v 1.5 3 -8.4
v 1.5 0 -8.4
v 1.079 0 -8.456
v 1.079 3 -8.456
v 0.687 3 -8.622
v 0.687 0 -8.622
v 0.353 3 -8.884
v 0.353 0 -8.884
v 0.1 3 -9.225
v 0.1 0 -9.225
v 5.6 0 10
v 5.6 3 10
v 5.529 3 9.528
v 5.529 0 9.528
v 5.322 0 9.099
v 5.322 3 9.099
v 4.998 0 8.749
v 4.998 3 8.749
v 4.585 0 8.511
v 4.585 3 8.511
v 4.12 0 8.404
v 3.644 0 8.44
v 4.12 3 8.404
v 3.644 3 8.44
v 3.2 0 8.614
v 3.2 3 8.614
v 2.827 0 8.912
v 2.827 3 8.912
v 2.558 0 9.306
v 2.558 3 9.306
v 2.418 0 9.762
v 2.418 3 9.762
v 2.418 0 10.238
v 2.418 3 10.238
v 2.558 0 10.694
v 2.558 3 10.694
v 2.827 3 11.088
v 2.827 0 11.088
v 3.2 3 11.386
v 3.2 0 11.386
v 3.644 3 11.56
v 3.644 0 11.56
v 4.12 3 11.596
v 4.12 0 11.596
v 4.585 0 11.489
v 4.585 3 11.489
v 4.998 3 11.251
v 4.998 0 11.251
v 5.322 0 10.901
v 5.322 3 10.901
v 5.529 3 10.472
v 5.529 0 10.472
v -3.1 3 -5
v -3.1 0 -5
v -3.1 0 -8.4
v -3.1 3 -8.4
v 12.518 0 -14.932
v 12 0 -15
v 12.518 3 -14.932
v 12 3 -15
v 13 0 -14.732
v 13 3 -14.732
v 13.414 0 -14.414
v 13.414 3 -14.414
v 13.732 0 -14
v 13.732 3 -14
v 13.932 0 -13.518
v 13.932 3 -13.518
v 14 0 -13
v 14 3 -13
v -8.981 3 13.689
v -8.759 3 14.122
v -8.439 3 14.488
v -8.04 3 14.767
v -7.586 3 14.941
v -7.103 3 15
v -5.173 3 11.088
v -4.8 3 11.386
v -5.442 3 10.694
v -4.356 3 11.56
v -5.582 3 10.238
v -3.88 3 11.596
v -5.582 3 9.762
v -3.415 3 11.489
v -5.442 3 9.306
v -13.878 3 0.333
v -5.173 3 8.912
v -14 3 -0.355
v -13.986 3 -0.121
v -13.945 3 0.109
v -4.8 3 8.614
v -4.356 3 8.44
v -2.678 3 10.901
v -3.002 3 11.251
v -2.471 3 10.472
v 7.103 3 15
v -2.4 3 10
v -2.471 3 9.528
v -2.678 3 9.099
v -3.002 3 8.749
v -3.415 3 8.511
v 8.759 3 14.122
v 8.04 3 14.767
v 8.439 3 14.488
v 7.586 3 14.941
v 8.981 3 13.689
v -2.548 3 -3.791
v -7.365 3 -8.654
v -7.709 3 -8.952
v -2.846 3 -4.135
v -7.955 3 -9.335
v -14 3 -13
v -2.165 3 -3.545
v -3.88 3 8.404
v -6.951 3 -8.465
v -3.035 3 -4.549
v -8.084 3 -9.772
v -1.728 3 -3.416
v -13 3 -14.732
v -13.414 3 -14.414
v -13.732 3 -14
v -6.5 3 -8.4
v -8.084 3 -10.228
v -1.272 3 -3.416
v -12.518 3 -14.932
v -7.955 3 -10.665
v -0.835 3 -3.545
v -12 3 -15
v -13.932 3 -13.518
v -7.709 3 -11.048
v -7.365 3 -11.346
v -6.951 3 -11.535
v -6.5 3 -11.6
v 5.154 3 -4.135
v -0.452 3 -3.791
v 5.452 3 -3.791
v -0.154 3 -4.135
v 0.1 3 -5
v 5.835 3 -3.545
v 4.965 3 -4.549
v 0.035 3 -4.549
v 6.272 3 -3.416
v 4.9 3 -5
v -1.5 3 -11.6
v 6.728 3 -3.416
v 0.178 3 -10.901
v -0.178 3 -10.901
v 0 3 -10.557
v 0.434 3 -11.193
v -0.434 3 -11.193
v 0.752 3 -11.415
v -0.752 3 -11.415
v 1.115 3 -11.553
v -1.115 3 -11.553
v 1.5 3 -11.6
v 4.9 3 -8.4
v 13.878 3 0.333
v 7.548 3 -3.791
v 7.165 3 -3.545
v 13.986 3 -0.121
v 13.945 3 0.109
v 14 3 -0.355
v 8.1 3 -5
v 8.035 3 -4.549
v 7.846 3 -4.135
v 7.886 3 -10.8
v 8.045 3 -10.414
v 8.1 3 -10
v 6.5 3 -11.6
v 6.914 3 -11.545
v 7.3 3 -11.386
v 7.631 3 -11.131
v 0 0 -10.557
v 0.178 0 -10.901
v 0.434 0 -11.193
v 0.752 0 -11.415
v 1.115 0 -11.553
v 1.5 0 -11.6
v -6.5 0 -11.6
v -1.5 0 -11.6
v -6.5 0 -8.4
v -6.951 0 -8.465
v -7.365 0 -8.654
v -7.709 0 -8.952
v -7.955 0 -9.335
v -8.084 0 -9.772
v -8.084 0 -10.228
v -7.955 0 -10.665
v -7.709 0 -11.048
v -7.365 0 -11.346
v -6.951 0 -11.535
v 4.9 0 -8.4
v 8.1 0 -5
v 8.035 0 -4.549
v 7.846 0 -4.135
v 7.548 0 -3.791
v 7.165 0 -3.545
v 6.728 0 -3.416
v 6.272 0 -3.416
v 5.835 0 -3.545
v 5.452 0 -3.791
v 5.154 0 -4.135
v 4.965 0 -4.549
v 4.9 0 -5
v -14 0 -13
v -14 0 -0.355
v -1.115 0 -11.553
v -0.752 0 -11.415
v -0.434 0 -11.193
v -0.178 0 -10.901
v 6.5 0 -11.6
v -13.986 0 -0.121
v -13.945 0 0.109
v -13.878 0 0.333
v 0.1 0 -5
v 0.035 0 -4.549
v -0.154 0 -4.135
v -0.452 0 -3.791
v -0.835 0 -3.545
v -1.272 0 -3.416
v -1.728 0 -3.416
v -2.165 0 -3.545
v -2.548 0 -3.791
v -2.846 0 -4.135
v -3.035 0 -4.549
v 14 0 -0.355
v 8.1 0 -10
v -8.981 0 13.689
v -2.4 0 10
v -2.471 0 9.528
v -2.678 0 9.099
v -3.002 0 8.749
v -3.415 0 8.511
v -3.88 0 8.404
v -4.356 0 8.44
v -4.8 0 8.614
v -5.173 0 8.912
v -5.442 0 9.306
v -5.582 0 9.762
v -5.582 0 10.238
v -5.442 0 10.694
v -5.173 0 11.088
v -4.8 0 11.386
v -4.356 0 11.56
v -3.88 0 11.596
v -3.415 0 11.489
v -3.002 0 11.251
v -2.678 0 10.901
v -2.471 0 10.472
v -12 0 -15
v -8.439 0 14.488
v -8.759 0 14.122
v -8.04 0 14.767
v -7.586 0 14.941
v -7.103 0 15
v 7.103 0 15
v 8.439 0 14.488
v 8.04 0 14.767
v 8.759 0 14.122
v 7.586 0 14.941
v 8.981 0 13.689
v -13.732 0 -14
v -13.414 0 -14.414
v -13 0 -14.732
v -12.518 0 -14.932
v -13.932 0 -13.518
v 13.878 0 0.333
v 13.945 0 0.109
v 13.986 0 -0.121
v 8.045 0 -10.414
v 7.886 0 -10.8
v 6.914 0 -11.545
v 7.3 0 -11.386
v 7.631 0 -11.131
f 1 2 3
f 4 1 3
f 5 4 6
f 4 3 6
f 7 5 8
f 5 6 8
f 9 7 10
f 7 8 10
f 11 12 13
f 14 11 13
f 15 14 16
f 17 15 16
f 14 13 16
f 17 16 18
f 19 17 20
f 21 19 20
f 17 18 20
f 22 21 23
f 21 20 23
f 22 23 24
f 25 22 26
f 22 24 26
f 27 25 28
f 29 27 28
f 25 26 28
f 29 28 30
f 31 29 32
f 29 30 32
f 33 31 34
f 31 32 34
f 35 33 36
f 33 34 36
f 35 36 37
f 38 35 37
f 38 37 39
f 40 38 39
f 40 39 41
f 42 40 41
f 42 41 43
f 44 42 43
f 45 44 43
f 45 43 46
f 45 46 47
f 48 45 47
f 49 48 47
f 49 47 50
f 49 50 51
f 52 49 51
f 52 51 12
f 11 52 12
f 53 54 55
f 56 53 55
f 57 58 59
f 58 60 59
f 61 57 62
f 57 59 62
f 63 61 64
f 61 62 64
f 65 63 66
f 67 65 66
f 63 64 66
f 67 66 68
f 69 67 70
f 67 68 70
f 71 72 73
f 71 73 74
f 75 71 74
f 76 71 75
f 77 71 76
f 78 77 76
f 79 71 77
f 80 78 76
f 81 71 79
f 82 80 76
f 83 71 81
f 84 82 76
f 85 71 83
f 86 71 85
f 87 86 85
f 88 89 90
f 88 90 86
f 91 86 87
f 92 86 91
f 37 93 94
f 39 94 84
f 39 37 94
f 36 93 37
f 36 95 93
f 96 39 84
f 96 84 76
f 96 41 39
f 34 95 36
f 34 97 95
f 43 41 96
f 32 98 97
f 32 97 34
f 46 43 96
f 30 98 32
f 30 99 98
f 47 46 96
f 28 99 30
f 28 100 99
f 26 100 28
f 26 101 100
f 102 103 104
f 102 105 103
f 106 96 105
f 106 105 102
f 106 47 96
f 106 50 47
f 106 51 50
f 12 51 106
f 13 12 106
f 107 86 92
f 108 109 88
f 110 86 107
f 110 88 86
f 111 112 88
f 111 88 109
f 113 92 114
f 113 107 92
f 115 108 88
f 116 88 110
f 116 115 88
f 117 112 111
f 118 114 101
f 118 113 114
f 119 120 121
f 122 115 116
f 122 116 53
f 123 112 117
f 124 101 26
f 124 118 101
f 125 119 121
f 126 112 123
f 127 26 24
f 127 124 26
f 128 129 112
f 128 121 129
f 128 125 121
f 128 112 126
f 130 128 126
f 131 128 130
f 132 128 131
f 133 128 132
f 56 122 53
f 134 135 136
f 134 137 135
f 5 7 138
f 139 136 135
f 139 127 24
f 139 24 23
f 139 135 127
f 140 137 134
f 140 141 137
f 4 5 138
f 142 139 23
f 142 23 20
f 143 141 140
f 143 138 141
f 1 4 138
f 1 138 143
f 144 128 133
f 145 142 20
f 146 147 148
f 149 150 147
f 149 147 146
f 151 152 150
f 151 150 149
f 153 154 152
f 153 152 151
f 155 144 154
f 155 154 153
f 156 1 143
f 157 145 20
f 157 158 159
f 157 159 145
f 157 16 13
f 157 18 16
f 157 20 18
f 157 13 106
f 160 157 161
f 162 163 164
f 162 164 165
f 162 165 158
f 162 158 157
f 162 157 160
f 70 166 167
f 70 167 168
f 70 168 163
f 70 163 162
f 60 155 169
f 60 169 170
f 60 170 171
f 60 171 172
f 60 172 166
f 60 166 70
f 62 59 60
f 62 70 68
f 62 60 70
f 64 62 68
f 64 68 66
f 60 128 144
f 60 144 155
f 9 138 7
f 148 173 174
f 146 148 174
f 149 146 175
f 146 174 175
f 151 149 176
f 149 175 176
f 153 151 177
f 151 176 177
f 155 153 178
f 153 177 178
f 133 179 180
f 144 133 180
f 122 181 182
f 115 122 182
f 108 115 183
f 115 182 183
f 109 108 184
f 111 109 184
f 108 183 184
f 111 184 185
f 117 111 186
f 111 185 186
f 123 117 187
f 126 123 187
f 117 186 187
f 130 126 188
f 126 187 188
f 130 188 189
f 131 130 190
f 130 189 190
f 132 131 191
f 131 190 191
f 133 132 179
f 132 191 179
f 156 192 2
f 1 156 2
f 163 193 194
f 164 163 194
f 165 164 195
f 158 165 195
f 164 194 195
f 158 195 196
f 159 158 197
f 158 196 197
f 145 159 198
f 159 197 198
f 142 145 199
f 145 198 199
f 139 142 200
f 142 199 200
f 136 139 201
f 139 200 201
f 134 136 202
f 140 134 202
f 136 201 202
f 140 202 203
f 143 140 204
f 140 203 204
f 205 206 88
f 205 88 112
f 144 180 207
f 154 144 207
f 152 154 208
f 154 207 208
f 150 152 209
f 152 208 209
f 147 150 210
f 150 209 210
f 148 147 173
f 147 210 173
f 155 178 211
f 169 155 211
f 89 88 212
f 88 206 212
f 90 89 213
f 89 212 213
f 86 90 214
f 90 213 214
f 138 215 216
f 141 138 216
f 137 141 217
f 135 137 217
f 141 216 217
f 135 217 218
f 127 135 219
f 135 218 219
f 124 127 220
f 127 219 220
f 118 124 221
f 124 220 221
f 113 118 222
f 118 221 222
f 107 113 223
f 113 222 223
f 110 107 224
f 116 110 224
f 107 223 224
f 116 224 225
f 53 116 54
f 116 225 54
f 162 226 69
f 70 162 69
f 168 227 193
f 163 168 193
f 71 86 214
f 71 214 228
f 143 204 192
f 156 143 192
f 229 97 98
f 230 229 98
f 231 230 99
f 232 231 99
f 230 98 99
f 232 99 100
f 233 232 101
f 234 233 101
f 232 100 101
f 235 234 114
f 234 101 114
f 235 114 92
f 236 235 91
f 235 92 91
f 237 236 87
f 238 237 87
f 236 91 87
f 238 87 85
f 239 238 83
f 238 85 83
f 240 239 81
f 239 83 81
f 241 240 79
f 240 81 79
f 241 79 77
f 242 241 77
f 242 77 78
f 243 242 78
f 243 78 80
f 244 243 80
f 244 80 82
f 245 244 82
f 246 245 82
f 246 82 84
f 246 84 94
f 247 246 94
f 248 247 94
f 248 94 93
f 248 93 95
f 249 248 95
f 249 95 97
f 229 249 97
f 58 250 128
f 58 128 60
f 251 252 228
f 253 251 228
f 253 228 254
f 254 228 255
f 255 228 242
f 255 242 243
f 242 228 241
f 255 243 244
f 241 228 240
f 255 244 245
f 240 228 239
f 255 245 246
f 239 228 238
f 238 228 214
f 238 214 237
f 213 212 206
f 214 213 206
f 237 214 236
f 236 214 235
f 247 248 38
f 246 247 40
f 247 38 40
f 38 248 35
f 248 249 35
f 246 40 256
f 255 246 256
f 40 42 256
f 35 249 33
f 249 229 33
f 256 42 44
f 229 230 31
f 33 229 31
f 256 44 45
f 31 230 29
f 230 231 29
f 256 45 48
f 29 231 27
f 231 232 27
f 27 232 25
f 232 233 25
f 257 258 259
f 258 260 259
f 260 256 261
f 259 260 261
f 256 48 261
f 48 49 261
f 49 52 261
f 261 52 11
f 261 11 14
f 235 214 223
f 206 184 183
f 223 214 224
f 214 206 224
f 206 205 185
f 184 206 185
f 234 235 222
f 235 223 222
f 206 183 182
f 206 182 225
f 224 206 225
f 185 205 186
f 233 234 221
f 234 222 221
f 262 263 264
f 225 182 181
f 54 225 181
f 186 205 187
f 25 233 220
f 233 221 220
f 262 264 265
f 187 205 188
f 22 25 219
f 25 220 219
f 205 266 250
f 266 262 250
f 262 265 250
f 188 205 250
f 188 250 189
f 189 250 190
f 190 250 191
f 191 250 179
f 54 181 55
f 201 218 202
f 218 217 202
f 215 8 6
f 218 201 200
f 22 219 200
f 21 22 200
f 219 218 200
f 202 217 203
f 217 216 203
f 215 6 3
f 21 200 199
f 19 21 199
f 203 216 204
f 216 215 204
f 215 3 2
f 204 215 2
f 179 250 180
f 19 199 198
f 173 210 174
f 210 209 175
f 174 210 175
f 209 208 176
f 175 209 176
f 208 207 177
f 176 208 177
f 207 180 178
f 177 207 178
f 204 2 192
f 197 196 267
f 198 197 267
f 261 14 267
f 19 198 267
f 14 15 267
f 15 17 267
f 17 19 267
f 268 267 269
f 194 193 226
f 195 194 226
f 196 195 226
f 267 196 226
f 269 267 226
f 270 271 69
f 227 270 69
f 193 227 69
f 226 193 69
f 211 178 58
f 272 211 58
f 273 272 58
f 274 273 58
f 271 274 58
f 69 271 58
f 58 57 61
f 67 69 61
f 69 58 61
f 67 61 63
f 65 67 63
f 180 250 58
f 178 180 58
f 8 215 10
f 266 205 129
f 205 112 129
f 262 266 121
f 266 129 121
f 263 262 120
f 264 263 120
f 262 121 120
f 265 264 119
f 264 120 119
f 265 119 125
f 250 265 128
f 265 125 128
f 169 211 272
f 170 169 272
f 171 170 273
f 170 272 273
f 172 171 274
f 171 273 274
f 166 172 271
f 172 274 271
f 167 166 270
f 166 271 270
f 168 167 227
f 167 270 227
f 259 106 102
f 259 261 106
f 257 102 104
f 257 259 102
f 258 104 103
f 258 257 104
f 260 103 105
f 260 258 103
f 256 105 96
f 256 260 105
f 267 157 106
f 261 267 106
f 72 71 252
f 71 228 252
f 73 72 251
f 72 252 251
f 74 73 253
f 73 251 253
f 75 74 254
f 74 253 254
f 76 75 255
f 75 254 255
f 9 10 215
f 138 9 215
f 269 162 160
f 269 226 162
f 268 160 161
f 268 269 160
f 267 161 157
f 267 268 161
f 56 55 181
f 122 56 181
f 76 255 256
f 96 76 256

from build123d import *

# Parameters (mm, degrees)
SKETCH1_W           = 28
SKETCH1_H           = 30
BOSS_EXTRUDE1_DEPTH = 3
SKETCH2_R           = 1.6
CUT_EXTRUDE1_DEPTH  = 4
FILLET1_R           = 2


with BuildPart() as part:
    # Sketch1 → Boss-Extrude1 (new body)
    with BuildSketch(Plane(origin=(0, 0, 0), x_dir=(1, 0, 0), z_dir=(0, 1, 0))):
        Rectangle(SKETCH1_W, SKETCH1_H)
        with BuildLine():
            ThreePointArc((1.5, 8.4), (0.687397597, 8.621712173), (0.1, 9.225403331))
            Line((0.1, 9.225403331), (0.1, 5))
            ThreePointArc((0.1, 5), (-1.5, 3.4), (-3.1, 5))
            Line((-3.1, 5), (-3.1, 8.4))
            Line((-3.1, 8.4), (-6.5, 8.4))
            ThreePointArc((-6.5, 8.4), (-8.1, 10), (-6.5, 11.6))
            Line((-6.5, 11.6), (-1.5, 11.6))
            ThreePointArc((-1.5, 11.6), (-0.586447127, 11.313552873), (0, 10.556776436))
            ThreePointArc((0, 10.556776436), (0.586447127, 11.313552873), (1.5, 11.6))
            Line((1.5, 11.6), (6.5, 11.6))
            ThreePointArc((6.5, 11.6), (7.63137085, 11.13137085), (8.1, 10))
            Line((8.1, 10), (8.1, 5))
            ThreePointArc((8.1, 5), (6.5, 3.4), (4.9, 5))
            Line((4.9, 5), (4.9, 8.4))
            Line((4.9, 8.4), (1.5, 8.4))
        make_face(mode=Mode.SUBTRACT)
    extrude(amount=BOSS_EXTRUDE1_DEPTH)

    # Sketch2 → Cut-Extrude1 (cut, through all)
    with BuildSketch(Plane(origin=(0, 3, 0), x_dir=(1, 0, 0), z_dir=(0, 1, 0))):
        with Locations((-4, -10)):
            Circle(SKETCH2_R)
        with Locations((4, -10)):
            Circle(SKETCH2_R)
        Polygon((14, 0), (8.5, -15), (14, -15), align=None)
        Polygon((-8.5, -15), (-14, -15), (-14, 0), align=None)
    extrude(amount=-CUT_EXTRUDE1_DEPTH, mode=Mode.SUBTRACT)

    # Fillet1
    fillet1_edges = [part.edges().sort_by_distance(p)[0] for p in [
        (-14, 1.5, -15),
        (14, 1.5, -15),
        (14, 1.5, 0),
        (8.5, 1.5, 15),
        (-14, 1.5, 0),
        (-8.5, 1.5, 15),
    ]]
    fillet(fillet1_edges, radius=FILLET1_R)


solid = part.part
